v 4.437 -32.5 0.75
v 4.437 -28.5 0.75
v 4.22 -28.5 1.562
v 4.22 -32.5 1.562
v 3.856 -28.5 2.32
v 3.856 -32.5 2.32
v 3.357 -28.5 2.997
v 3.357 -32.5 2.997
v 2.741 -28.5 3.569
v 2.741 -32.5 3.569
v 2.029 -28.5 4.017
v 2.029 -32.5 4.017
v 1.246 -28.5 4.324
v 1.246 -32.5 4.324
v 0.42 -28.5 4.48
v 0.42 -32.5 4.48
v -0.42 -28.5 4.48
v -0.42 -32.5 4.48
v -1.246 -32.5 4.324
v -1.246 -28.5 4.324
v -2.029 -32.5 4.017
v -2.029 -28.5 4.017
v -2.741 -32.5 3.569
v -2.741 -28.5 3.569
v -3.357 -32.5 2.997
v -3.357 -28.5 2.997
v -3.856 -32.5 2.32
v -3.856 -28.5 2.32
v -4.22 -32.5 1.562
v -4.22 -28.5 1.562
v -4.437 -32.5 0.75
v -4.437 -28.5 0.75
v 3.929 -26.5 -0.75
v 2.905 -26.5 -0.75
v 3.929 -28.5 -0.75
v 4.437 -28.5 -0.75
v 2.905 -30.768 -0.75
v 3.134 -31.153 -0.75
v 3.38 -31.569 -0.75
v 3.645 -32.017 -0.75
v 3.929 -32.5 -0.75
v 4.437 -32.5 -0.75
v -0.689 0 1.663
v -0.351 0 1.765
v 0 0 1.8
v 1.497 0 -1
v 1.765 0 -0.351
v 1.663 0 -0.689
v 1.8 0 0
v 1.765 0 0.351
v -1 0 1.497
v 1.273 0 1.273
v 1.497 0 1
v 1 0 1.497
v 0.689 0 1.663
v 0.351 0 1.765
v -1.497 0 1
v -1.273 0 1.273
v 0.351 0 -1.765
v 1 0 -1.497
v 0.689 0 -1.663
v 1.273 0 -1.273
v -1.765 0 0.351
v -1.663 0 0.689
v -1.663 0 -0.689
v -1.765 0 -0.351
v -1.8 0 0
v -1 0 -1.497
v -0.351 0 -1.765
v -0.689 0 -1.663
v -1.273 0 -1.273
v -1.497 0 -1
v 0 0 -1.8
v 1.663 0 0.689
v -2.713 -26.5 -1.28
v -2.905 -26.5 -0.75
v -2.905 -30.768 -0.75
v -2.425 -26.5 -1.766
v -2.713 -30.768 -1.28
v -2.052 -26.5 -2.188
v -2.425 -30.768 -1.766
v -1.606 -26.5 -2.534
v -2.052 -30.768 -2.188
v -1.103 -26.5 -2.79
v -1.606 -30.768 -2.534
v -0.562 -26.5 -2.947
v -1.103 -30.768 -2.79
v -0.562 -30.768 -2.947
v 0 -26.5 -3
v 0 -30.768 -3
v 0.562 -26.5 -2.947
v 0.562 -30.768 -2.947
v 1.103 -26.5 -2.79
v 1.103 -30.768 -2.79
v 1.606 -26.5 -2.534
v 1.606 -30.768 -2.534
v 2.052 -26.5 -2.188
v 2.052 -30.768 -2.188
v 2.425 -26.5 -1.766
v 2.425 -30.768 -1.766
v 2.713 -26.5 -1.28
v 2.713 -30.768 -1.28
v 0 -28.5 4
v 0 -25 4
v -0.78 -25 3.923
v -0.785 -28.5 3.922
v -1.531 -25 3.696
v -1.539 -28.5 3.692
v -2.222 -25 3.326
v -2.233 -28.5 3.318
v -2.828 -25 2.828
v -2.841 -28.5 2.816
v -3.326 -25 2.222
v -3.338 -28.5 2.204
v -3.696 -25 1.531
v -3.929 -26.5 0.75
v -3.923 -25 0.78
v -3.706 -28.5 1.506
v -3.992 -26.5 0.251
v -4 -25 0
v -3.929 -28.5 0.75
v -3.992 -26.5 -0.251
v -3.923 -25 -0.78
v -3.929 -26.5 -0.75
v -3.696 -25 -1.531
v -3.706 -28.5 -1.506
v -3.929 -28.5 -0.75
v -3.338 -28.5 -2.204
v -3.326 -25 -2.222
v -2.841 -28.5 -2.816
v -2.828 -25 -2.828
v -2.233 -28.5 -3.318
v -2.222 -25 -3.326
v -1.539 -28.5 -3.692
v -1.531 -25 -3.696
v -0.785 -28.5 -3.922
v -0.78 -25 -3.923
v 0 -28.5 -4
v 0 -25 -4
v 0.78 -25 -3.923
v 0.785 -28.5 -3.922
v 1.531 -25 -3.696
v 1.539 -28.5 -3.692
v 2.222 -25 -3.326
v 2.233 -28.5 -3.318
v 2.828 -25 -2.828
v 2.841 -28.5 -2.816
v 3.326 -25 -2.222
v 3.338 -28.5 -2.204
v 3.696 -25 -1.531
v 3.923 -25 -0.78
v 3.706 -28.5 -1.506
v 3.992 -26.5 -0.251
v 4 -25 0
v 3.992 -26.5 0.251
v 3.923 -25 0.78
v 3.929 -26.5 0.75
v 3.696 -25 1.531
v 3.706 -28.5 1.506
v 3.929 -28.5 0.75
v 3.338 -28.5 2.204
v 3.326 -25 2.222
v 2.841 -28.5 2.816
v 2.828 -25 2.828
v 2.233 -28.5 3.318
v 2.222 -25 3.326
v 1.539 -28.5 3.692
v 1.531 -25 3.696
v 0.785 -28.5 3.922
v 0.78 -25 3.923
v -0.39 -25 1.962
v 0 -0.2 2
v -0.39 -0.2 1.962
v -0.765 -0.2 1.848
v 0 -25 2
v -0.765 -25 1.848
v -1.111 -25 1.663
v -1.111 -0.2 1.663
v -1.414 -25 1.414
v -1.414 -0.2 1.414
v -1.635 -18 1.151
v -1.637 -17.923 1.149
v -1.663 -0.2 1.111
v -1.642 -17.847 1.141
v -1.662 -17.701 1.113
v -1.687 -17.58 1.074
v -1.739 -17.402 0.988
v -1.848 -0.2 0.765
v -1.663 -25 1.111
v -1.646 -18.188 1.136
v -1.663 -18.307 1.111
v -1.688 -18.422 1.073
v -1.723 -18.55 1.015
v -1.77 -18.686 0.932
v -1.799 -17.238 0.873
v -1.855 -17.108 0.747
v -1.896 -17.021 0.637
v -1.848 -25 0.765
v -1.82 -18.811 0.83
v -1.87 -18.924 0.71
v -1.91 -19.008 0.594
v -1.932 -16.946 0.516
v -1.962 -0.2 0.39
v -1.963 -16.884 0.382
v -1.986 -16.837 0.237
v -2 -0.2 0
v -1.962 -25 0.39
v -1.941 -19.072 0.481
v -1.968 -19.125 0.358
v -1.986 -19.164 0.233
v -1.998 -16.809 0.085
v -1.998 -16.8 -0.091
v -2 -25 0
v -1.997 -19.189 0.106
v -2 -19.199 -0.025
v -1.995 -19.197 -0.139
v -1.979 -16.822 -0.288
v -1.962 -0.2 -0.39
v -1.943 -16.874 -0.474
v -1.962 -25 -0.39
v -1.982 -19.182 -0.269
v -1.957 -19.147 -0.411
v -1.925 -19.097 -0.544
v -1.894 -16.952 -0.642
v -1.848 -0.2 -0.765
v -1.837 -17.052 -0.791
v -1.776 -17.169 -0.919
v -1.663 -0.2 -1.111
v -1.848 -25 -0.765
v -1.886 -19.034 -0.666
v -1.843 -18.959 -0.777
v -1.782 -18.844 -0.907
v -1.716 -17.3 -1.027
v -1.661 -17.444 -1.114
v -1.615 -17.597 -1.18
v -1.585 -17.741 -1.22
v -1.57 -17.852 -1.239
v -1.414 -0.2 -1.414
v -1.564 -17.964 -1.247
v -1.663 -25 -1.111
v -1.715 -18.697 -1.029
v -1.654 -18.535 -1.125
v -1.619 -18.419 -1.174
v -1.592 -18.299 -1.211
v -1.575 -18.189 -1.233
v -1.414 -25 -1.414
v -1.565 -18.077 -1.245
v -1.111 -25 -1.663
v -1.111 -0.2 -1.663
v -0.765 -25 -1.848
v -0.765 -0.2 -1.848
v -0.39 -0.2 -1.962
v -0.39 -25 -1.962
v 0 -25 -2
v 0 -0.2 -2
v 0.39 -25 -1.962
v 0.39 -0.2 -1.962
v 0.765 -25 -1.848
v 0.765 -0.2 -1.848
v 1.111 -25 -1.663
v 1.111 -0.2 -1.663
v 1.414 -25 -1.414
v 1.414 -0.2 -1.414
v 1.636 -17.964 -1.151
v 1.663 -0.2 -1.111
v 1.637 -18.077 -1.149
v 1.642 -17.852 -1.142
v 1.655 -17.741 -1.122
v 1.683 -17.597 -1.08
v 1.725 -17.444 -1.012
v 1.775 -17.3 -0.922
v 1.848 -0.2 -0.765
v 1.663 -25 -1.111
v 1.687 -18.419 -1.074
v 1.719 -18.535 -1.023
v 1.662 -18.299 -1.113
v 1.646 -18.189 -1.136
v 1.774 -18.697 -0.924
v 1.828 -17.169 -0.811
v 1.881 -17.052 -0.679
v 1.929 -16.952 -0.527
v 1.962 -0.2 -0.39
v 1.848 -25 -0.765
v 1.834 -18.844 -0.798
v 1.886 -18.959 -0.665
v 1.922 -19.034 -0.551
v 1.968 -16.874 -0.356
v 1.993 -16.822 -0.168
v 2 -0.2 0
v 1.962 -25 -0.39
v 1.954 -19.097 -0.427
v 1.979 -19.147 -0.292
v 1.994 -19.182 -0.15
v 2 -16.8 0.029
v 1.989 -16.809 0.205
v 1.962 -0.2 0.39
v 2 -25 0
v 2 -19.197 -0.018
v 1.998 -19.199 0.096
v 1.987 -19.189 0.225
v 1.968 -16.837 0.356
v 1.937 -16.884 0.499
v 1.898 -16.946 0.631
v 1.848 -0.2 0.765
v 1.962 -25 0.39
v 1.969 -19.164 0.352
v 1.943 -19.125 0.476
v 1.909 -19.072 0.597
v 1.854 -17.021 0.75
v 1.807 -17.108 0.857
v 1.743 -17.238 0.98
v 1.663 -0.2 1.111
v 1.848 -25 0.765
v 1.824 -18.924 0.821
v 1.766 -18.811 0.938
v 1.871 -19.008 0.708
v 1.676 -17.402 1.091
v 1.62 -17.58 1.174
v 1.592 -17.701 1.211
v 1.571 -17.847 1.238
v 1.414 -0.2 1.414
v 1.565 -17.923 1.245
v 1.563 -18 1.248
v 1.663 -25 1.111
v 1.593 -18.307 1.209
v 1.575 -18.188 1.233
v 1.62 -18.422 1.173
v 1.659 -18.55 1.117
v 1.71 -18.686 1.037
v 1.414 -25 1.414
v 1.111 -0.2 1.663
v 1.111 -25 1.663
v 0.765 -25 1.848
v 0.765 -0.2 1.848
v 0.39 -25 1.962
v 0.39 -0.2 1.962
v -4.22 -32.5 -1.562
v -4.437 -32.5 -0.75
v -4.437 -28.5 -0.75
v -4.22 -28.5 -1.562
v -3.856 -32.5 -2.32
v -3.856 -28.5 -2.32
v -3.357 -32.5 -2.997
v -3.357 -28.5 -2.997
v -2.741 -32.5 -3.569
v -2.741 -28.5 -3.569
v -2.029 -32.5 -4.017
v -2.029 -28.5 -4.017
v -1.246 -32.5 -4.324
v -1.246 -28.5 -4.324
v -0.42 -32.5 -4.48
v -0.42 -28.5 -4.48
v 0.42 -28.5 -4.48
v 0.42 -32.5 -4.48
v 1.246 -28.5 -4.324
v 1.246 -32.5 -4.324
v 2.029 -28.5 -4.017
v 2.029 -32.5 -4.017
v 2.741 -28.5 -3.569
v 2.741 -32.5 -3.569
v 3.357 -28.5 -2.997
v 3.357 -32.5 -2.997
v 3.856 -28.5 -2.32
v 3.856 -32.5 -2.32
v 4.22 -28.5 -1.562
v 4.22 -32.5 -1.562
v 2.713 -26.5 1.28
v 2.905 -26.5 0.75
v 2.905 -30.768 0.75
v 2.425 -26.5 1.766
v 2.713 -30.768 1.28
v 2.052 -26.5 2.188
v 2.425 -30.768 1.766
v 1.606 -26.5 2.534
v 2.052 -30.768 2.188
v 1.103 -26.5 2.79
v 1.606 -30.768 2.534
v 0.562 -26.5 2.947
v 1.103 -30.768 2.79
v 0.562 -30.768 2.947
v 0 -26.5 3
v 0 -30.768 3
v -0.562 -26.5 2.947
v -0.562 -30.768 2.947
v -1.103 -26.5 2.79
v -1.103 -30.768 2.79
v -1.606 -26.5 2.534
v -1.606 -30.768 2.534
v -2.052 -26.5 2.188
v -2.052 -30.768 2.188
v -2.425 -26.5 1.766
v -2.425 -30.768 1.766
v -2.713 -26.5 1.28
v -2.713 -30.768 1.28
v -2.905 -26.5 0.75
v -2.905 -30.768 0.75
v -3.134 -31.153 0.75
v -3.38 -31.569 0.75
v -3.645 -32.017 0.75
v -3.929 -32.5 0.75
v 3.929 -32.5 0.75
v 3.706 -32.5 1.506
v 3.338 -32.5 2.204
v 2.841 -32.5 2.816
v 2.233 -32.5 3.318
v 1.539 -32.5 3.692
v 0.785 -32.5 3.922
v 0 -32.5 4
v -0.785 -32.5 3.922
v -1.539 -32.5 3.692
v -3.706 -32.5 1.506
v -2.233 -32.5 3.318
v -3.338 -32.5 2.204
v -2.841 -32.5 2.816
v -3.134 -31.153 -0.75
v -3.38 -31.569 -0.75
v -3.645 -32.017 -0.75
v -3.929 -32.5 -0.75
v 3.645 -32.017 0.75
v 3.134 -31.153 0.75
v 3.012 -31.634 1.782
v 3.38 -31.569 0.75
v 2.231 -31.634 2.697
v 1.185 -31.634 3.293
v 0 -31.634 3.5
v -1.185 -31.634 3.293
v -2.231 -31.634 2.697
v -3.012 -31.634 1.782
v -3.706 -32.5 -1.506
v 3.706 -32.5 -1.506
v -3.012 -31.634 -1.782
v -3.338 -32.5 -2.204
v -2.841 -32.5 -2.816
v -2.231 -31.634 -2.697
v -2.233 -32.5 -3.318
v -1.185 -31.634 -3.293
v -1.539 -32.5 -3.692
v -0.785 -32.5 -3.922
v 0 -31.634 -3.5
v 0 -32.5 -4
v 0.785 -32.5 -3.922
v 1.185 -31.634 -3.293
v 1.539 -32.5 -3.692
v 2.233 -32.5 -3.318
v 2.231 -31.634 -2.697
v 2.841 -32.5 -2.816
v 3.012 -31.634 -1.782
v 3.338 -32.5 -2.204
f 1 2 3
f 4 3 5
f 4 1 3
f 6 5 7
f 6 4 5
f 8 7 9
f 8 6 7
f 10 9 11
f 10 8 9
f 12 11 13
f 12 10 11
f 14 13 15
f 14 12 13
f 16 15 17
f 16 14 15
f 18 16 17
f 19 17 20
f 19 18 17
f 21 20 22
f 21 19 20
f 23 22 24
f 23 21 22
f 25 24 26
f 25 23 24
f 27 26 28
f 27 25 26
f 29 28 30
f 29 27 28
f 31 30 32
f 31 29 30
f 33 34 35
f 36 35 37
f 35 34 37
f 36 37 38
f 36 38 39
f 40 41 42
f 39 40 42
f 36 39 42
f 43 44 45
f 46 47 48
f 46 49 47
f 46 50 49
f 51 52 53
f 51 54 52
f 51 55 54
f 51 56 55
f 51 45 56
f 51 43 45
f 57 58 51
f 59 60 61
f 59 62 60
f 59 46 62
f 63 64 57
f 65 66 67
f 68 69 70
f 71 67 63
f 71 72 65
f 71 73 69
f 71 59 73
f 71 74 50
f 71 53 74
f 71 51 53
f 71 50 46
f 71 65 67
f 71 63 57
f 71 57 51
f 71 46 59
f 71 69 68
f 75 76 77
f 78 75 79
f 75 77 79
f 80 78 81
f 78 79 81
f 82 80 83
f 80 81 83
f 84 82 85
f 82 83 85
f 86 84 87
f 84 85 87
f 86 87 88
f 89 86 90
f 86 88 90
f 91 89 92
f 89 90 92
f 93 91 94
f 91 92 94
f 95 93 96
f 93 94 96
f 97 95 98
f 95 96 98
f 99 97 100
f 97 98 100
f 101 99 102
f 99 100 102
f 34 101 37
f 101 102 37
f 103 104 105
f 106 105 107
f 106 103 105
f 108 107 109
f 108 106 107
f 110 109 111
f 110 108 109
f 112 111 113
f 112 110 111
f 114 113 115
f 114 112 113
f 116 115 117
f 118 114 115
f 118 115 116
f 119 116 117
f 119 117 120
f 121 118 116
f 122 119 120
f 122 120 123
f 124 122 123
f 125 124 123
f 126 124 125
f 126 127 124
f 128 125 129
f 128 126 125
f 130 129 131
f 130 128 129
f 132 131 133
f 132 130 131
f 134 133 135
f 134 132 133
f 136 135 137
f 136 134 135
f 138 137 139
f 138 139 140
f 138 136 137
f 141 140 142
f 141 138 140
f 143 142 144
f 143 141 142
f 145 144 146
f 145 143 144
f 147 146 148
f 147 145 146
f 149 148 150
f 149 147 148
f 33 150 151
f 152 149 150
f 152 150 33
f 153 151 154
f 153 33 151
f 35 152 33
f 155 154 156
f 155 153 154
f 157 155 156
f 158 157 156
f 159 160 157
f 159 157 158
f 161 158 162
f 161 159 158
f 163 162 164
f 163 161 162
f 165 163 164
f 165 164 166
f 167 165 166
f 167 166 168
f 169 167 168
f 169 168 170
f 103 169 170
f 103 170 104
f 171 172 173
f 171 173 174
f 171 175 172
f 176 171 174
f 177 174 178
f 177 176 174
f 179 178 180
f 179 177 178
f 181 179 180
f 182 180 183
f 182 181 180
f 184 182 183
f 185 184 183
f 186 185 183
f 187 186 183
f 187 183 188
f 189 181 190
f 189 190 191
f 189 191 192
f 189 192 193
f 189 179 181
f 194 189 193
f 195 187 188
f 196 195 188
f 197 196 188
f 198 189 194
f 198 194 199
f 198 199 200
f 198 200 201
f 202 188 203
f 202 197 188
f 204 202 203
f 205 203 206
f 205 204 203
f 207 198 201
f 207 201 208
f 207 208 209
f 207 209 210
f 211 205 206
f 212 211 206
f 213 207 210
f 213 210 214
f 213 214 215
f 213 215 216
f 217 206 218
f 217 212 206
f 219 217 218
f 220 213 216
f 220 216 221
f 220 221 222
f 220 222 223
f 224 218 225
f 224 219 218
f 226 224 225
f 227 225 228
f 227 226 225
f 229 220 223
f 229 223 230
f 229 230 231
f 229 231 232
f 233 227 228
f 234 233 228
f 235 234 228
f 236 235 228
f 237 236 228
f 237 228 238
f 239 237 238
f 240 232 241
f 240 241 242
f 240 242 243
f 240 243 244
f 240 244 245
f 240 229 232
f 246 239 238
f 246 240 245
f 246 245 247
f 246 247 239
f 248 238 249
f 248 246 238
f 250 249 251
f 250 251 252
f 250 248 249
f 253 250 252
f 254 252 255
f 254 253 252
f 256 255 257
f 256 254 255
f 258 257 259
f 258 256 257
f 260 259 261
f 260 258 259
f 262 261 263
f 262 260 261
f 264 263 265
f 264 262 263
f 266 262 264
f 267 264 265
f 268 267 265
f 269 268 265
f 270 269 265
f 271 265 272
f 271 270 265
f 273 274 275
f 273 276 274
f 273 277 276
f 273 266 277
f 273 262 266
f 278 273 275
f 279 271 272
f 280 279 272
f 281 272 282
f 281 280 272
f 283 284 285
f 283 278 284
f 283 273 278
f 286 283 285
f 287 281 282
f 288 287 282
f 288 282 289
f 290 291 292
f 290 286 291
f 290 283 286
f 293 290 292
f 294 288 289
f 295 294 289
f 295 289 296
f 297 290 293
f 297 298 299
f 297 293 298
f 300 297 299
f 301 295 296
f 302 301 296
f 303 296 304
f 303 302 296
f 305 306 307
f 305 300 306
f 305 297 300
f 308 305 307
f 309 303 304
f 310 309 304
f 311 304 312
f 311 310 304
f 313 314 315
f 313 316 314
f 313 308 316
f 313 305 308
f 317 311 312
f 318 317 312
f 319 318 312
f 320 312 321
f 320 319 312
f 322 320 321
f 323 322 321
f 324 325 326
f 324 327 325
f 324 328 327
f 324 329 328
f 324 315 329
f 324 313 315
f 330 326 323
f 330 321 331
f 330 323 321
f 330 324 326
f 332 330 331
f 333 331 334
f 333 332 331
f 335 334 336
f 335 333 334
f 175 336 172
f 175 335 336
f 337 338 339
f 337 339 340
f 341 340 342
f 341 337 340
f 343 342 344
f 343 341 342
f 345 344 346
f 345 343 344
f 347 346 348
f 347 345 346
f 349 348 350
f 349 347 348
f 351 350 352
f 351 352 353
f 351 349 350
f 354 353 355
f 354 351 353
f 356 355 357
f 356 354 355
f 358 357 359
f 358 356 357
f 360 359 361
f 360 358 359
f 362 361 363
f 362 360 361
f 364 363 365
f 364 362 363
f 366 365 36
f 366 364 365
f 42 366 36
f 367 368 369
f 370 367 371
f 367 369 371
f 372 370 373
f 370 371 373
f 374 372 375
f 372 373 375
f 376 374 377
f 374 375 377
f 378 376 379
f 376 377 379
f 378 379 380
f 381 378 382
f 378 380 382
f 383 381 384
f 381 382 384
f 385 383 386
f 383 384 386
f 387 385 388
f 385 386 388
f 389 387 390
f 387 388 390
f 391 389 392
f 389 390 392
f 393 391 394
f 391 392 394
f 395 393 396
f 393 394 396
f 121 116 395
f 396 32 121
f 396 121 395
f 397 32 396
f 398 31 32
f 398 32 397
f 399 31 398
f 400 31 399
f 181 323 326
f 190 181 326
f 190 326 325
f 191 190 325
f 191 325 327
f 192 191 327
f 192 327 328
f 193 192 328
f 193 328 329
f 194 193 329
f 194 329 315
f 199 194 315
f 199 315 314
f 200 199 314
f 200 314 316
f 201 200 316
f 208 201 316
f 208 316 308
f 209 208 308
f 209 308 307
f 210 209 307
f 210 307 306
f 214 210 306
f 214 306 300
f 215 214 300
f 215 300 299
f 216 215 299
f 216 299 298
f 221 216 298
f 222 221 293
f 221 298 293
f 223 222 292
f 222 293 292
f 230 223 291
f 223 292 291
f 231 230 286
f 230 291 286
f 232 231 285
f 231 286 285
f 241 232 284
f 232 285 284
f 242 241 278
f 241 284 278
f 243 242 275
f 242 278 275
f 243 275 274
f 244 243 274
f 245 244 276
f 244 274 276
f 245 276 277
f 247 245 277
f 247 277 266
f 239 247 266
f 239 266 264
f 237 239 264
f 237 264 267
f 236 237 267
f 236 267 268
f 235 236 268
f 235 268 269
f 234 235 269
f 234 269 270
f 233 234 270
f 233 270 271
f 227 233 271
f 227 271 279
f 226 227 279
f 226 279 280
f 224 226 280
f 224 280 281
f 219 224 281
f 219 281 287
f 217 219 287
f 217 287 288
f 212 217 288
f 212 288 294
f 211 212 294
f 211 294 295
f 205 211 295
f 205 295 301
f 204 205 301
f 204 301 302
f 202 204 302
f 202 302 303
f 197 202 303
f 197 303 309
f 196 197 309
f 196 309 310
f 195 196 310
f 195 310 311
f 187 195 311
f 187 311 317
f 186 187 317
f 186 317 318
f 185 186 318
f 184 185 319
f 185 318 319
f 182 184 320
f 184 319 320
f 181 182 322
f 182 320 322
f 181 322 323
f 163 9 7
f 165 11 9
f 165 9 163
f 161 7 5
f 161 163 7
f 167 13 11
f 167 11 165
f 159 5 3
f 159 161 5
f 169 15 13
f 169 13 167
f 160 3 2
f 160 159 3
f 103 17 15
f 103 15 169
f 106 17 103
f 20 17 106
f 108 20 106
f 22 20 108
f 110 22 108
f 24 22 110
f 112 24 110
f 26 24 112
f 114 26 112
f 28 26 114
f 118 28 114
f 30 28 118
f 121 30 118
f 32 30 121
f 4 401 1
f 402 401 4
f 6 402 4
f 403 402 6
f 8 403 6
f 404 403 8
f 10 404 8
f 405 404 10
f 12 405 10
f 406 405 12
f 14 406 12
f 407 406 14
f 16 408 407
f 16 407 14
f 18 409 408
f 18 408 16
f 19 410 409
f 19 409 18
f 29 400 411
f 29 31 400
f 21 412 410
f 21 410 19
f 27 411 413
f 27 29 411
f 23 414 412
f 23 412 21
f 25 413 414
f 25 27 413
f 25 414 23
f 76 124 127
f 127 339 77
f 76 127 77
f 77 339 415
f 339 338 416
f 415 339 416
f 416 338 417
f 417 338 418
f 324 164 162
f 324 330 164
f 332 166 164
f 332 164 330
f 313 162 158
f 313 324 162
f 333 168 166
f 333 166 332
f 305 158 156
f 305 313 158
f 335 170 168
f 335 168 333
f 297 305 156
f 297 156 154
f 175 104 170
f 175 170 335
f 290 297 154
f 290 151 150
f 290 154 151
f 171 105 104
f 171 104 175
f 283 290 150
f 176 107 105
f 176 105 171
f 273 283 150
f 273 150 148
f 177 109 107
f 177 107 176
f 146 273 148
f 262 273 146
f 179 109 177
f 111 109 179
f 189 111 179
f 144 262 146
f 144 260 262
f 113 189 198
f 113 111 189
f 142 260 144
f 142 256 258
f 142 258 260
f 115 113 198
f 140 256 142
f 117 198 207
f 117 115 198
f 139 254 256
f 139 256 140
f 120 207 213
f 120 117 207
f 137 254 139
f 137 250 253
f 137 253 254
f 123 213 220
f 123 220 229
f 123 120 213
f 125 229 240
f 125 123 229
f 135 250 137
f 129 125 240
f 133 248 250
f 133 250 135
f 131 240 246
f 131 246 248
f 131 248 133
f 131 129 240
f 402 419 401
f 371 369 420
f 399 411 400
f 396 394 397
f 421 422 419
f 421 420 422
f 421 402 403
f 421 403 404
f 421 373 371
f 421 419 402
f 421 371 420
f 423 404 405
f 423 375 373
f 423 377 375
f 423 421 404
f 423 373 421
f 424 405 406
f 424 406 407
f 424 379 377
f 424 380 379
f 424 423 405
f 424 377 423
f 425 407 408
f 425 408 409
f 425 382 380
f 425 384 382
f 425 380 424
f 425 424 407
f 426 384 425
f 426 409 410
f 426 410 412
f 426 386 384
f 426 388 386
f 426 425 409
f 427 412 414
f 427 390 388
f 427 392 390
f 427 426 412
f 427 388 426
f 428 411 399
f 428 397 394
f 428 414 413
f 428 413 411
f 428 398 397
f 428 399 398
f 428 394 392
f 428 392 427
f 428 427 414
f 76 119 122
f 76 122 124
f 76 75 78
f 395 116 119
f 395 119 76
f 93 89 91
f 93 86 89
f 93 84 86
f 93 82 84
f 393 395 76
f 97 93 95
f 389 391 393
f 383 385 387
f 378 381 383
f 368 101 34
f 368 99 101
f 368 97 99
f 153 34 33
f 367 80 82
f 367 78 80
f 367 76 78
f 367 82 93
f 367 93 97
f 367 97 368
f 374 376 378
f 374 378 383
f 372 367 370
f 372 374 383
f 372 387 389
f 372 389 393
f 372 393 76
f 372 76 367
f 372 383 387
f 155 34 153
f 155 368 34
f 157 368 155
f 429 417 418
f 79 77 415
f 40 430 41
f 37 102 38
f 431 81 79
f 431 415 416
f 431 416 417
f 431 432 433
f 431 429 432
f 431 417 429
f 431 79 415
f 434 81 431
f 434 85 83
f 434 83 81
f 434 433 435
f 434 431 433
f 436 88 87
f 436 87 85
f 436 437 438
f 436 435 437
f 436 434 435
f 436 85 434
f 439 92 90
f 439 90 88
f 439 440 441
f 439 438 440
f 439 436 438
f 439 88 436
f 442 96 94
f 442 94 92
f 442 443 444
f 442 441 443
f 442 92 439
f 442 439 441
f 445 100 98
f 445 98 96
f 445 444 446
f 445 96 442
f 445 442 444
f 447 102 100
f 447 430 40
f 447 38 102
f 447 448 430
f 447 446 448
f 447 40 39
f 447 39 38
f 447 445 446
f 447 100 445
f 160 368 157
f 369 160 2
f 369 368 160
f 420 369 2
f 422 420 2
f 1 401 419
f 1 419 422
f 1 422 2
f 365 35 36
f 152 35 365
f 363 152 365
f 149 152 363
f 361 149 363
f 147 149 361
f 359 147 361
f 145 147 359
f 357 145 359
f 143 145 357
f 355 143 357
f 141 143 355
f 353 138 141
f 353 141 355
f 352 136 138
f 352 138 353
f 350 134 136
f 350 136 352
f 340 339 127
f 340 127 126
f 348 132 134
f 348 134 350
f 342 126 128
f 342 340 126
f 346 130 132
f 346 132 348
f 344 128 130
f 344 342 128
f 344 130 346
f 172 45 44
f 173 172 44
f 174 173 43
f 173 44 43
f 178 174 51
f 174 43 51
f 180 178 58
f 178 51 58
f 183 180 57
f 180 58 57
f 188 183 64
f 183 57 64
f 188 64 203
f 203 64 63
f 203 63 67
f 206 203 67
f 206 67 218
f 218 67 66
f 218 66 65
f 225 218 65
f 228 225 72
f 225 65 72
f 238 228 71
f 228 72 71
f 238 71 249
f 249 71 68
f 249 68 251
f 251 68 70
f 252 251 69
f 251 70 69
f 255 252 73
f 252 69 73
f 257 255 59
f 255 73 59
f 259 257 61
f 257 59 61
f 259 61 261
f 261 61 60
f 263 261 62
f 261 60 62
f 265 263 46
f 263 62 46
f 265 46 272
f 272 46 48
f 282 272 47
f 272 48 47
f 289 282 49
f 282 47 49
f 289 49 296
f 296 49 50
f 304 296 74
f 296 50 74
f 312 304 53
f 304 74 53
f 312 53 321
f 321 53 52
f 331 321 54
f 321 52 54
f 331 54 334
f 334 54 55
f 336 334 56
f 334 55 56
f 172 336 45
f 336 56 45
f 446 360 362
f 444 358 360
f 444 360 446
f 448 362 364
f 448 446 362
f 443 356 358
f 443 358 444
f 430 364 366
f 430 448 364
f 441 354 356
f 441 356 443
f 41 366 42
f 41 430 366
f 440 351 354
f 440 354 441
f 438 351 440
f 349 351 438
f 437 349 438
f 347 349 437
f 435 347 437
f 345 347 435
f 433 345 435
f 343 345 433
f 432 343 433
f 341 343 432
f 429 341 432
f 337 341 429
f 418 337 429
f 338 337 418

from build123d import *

# Parameters (mm, degrees)
SKETCH_2_R             = 3
CUT_EXTRUDE_1_DEPTH    = 6
CHAMFER_1_SIZE         = 1
CHAMFER_1_SIZE2        = 1.732050808
SKETCH_3_W             = 11
SKETCH_3_H             = 1.5
CUT_EXTRUDE_3_DEPTH    = 6
CHAMFER_2_SIZE         = 0.2
HOLE_WIZARD_M2_1_D     = 2.4
HOLE_WIZARD_M2_1_DEPTH = 10
HOLE_WIZARD_M2_1_TIP   = 0.721032743


with BuildPart() as part:
    # 草图1 → 旋转1 (revolve)
    with BuildSketch(Plane.XY, mode=Mode.PRIVATE) as revolve_1_sk:
        Polygon((0, 0), (-2, 0), (-2, -25), (-4, -25), (-4, -28.5), (-4.5, -28.5), (-4.5, -32.5), (0, -32.5), align=None)
    revolve(revolve_1_sk.sketch.rotate(Axis((0, 0, 0), (0, -1, 0)), 270), axis=Axis((0, 0, 0), (0, -1, 0)))

    # 草图2 → 切除-拉伸1 (cut)
    with BuildSketch(Plane.XZ.offset(32.5)):
        with Locations(Location((0, 0, 0), (0, 0, 270))):
            Circle(SKETCH_2_R)
    extrude(amount=-CUT_EXTRUDE_1_DEPTH, mode=Mode.SUBTRACT)

    # 倒角1
    chamfer_1_edges = [part.edges().sort_by_distance(p)[0] for p in [
        (0, -32.5, 3),
    ]]
    chamfer_1_side = [part.faces().sort_by_distance(p)[0] for p in [
        (0, -32.5, -4.372720779),
    ]]
    chamfer(chamfer_1_edges, length=CHAMFER_1_SIZE, length2=CHAMFER_1_SIZE2, reference=chamfer_1_side[0])

    # 草图3 → 切除-拉伸3 (cut)
    with BuildSketch(Plane.XZ.offset(32.5)):
        Rectangle(SKETCH_3_W, SKETCH_3_H)
    extrude(amount=-CUT_EXTRUDE_3_DEPTH, mode=Mode.SUBTRACT)

    # 倒角2
    chamfer_2_edges = [part.edges().sort_by_distance(p)[0] for p in [
        (0, 0, -2),
    ]]
    chamfer(chamfer_2_edges, length=CHAMFER_2_SIZE)

    # M2 间隙孔1
    with Locations(Plane(origin=(-1.999095, -18, -0.060159626), x_dir=(0.030079813167, 0, -0.999547500042), z_dir=(-0.999547500042, 0, -0.030079813167))):
        with Locations((0, 0)):
            Hole(HOLE_WIZARD_M2_1_D / 2, depth=HOLE_WIZARD_M2_1_DEPTH)
            with Locations((0, 0, -(HOLE_WIZARD_M2_1_DEPTH + HOLE_WIZARD_M2_1_TIP / 2))):  # 118° drill point
                Cone(0, HOLE_WIZARD_M2_1_D / 2, HOLE_WIZARD_M2_1_TIP, mode=Mode.SUBTRACT)


solid = part.part
